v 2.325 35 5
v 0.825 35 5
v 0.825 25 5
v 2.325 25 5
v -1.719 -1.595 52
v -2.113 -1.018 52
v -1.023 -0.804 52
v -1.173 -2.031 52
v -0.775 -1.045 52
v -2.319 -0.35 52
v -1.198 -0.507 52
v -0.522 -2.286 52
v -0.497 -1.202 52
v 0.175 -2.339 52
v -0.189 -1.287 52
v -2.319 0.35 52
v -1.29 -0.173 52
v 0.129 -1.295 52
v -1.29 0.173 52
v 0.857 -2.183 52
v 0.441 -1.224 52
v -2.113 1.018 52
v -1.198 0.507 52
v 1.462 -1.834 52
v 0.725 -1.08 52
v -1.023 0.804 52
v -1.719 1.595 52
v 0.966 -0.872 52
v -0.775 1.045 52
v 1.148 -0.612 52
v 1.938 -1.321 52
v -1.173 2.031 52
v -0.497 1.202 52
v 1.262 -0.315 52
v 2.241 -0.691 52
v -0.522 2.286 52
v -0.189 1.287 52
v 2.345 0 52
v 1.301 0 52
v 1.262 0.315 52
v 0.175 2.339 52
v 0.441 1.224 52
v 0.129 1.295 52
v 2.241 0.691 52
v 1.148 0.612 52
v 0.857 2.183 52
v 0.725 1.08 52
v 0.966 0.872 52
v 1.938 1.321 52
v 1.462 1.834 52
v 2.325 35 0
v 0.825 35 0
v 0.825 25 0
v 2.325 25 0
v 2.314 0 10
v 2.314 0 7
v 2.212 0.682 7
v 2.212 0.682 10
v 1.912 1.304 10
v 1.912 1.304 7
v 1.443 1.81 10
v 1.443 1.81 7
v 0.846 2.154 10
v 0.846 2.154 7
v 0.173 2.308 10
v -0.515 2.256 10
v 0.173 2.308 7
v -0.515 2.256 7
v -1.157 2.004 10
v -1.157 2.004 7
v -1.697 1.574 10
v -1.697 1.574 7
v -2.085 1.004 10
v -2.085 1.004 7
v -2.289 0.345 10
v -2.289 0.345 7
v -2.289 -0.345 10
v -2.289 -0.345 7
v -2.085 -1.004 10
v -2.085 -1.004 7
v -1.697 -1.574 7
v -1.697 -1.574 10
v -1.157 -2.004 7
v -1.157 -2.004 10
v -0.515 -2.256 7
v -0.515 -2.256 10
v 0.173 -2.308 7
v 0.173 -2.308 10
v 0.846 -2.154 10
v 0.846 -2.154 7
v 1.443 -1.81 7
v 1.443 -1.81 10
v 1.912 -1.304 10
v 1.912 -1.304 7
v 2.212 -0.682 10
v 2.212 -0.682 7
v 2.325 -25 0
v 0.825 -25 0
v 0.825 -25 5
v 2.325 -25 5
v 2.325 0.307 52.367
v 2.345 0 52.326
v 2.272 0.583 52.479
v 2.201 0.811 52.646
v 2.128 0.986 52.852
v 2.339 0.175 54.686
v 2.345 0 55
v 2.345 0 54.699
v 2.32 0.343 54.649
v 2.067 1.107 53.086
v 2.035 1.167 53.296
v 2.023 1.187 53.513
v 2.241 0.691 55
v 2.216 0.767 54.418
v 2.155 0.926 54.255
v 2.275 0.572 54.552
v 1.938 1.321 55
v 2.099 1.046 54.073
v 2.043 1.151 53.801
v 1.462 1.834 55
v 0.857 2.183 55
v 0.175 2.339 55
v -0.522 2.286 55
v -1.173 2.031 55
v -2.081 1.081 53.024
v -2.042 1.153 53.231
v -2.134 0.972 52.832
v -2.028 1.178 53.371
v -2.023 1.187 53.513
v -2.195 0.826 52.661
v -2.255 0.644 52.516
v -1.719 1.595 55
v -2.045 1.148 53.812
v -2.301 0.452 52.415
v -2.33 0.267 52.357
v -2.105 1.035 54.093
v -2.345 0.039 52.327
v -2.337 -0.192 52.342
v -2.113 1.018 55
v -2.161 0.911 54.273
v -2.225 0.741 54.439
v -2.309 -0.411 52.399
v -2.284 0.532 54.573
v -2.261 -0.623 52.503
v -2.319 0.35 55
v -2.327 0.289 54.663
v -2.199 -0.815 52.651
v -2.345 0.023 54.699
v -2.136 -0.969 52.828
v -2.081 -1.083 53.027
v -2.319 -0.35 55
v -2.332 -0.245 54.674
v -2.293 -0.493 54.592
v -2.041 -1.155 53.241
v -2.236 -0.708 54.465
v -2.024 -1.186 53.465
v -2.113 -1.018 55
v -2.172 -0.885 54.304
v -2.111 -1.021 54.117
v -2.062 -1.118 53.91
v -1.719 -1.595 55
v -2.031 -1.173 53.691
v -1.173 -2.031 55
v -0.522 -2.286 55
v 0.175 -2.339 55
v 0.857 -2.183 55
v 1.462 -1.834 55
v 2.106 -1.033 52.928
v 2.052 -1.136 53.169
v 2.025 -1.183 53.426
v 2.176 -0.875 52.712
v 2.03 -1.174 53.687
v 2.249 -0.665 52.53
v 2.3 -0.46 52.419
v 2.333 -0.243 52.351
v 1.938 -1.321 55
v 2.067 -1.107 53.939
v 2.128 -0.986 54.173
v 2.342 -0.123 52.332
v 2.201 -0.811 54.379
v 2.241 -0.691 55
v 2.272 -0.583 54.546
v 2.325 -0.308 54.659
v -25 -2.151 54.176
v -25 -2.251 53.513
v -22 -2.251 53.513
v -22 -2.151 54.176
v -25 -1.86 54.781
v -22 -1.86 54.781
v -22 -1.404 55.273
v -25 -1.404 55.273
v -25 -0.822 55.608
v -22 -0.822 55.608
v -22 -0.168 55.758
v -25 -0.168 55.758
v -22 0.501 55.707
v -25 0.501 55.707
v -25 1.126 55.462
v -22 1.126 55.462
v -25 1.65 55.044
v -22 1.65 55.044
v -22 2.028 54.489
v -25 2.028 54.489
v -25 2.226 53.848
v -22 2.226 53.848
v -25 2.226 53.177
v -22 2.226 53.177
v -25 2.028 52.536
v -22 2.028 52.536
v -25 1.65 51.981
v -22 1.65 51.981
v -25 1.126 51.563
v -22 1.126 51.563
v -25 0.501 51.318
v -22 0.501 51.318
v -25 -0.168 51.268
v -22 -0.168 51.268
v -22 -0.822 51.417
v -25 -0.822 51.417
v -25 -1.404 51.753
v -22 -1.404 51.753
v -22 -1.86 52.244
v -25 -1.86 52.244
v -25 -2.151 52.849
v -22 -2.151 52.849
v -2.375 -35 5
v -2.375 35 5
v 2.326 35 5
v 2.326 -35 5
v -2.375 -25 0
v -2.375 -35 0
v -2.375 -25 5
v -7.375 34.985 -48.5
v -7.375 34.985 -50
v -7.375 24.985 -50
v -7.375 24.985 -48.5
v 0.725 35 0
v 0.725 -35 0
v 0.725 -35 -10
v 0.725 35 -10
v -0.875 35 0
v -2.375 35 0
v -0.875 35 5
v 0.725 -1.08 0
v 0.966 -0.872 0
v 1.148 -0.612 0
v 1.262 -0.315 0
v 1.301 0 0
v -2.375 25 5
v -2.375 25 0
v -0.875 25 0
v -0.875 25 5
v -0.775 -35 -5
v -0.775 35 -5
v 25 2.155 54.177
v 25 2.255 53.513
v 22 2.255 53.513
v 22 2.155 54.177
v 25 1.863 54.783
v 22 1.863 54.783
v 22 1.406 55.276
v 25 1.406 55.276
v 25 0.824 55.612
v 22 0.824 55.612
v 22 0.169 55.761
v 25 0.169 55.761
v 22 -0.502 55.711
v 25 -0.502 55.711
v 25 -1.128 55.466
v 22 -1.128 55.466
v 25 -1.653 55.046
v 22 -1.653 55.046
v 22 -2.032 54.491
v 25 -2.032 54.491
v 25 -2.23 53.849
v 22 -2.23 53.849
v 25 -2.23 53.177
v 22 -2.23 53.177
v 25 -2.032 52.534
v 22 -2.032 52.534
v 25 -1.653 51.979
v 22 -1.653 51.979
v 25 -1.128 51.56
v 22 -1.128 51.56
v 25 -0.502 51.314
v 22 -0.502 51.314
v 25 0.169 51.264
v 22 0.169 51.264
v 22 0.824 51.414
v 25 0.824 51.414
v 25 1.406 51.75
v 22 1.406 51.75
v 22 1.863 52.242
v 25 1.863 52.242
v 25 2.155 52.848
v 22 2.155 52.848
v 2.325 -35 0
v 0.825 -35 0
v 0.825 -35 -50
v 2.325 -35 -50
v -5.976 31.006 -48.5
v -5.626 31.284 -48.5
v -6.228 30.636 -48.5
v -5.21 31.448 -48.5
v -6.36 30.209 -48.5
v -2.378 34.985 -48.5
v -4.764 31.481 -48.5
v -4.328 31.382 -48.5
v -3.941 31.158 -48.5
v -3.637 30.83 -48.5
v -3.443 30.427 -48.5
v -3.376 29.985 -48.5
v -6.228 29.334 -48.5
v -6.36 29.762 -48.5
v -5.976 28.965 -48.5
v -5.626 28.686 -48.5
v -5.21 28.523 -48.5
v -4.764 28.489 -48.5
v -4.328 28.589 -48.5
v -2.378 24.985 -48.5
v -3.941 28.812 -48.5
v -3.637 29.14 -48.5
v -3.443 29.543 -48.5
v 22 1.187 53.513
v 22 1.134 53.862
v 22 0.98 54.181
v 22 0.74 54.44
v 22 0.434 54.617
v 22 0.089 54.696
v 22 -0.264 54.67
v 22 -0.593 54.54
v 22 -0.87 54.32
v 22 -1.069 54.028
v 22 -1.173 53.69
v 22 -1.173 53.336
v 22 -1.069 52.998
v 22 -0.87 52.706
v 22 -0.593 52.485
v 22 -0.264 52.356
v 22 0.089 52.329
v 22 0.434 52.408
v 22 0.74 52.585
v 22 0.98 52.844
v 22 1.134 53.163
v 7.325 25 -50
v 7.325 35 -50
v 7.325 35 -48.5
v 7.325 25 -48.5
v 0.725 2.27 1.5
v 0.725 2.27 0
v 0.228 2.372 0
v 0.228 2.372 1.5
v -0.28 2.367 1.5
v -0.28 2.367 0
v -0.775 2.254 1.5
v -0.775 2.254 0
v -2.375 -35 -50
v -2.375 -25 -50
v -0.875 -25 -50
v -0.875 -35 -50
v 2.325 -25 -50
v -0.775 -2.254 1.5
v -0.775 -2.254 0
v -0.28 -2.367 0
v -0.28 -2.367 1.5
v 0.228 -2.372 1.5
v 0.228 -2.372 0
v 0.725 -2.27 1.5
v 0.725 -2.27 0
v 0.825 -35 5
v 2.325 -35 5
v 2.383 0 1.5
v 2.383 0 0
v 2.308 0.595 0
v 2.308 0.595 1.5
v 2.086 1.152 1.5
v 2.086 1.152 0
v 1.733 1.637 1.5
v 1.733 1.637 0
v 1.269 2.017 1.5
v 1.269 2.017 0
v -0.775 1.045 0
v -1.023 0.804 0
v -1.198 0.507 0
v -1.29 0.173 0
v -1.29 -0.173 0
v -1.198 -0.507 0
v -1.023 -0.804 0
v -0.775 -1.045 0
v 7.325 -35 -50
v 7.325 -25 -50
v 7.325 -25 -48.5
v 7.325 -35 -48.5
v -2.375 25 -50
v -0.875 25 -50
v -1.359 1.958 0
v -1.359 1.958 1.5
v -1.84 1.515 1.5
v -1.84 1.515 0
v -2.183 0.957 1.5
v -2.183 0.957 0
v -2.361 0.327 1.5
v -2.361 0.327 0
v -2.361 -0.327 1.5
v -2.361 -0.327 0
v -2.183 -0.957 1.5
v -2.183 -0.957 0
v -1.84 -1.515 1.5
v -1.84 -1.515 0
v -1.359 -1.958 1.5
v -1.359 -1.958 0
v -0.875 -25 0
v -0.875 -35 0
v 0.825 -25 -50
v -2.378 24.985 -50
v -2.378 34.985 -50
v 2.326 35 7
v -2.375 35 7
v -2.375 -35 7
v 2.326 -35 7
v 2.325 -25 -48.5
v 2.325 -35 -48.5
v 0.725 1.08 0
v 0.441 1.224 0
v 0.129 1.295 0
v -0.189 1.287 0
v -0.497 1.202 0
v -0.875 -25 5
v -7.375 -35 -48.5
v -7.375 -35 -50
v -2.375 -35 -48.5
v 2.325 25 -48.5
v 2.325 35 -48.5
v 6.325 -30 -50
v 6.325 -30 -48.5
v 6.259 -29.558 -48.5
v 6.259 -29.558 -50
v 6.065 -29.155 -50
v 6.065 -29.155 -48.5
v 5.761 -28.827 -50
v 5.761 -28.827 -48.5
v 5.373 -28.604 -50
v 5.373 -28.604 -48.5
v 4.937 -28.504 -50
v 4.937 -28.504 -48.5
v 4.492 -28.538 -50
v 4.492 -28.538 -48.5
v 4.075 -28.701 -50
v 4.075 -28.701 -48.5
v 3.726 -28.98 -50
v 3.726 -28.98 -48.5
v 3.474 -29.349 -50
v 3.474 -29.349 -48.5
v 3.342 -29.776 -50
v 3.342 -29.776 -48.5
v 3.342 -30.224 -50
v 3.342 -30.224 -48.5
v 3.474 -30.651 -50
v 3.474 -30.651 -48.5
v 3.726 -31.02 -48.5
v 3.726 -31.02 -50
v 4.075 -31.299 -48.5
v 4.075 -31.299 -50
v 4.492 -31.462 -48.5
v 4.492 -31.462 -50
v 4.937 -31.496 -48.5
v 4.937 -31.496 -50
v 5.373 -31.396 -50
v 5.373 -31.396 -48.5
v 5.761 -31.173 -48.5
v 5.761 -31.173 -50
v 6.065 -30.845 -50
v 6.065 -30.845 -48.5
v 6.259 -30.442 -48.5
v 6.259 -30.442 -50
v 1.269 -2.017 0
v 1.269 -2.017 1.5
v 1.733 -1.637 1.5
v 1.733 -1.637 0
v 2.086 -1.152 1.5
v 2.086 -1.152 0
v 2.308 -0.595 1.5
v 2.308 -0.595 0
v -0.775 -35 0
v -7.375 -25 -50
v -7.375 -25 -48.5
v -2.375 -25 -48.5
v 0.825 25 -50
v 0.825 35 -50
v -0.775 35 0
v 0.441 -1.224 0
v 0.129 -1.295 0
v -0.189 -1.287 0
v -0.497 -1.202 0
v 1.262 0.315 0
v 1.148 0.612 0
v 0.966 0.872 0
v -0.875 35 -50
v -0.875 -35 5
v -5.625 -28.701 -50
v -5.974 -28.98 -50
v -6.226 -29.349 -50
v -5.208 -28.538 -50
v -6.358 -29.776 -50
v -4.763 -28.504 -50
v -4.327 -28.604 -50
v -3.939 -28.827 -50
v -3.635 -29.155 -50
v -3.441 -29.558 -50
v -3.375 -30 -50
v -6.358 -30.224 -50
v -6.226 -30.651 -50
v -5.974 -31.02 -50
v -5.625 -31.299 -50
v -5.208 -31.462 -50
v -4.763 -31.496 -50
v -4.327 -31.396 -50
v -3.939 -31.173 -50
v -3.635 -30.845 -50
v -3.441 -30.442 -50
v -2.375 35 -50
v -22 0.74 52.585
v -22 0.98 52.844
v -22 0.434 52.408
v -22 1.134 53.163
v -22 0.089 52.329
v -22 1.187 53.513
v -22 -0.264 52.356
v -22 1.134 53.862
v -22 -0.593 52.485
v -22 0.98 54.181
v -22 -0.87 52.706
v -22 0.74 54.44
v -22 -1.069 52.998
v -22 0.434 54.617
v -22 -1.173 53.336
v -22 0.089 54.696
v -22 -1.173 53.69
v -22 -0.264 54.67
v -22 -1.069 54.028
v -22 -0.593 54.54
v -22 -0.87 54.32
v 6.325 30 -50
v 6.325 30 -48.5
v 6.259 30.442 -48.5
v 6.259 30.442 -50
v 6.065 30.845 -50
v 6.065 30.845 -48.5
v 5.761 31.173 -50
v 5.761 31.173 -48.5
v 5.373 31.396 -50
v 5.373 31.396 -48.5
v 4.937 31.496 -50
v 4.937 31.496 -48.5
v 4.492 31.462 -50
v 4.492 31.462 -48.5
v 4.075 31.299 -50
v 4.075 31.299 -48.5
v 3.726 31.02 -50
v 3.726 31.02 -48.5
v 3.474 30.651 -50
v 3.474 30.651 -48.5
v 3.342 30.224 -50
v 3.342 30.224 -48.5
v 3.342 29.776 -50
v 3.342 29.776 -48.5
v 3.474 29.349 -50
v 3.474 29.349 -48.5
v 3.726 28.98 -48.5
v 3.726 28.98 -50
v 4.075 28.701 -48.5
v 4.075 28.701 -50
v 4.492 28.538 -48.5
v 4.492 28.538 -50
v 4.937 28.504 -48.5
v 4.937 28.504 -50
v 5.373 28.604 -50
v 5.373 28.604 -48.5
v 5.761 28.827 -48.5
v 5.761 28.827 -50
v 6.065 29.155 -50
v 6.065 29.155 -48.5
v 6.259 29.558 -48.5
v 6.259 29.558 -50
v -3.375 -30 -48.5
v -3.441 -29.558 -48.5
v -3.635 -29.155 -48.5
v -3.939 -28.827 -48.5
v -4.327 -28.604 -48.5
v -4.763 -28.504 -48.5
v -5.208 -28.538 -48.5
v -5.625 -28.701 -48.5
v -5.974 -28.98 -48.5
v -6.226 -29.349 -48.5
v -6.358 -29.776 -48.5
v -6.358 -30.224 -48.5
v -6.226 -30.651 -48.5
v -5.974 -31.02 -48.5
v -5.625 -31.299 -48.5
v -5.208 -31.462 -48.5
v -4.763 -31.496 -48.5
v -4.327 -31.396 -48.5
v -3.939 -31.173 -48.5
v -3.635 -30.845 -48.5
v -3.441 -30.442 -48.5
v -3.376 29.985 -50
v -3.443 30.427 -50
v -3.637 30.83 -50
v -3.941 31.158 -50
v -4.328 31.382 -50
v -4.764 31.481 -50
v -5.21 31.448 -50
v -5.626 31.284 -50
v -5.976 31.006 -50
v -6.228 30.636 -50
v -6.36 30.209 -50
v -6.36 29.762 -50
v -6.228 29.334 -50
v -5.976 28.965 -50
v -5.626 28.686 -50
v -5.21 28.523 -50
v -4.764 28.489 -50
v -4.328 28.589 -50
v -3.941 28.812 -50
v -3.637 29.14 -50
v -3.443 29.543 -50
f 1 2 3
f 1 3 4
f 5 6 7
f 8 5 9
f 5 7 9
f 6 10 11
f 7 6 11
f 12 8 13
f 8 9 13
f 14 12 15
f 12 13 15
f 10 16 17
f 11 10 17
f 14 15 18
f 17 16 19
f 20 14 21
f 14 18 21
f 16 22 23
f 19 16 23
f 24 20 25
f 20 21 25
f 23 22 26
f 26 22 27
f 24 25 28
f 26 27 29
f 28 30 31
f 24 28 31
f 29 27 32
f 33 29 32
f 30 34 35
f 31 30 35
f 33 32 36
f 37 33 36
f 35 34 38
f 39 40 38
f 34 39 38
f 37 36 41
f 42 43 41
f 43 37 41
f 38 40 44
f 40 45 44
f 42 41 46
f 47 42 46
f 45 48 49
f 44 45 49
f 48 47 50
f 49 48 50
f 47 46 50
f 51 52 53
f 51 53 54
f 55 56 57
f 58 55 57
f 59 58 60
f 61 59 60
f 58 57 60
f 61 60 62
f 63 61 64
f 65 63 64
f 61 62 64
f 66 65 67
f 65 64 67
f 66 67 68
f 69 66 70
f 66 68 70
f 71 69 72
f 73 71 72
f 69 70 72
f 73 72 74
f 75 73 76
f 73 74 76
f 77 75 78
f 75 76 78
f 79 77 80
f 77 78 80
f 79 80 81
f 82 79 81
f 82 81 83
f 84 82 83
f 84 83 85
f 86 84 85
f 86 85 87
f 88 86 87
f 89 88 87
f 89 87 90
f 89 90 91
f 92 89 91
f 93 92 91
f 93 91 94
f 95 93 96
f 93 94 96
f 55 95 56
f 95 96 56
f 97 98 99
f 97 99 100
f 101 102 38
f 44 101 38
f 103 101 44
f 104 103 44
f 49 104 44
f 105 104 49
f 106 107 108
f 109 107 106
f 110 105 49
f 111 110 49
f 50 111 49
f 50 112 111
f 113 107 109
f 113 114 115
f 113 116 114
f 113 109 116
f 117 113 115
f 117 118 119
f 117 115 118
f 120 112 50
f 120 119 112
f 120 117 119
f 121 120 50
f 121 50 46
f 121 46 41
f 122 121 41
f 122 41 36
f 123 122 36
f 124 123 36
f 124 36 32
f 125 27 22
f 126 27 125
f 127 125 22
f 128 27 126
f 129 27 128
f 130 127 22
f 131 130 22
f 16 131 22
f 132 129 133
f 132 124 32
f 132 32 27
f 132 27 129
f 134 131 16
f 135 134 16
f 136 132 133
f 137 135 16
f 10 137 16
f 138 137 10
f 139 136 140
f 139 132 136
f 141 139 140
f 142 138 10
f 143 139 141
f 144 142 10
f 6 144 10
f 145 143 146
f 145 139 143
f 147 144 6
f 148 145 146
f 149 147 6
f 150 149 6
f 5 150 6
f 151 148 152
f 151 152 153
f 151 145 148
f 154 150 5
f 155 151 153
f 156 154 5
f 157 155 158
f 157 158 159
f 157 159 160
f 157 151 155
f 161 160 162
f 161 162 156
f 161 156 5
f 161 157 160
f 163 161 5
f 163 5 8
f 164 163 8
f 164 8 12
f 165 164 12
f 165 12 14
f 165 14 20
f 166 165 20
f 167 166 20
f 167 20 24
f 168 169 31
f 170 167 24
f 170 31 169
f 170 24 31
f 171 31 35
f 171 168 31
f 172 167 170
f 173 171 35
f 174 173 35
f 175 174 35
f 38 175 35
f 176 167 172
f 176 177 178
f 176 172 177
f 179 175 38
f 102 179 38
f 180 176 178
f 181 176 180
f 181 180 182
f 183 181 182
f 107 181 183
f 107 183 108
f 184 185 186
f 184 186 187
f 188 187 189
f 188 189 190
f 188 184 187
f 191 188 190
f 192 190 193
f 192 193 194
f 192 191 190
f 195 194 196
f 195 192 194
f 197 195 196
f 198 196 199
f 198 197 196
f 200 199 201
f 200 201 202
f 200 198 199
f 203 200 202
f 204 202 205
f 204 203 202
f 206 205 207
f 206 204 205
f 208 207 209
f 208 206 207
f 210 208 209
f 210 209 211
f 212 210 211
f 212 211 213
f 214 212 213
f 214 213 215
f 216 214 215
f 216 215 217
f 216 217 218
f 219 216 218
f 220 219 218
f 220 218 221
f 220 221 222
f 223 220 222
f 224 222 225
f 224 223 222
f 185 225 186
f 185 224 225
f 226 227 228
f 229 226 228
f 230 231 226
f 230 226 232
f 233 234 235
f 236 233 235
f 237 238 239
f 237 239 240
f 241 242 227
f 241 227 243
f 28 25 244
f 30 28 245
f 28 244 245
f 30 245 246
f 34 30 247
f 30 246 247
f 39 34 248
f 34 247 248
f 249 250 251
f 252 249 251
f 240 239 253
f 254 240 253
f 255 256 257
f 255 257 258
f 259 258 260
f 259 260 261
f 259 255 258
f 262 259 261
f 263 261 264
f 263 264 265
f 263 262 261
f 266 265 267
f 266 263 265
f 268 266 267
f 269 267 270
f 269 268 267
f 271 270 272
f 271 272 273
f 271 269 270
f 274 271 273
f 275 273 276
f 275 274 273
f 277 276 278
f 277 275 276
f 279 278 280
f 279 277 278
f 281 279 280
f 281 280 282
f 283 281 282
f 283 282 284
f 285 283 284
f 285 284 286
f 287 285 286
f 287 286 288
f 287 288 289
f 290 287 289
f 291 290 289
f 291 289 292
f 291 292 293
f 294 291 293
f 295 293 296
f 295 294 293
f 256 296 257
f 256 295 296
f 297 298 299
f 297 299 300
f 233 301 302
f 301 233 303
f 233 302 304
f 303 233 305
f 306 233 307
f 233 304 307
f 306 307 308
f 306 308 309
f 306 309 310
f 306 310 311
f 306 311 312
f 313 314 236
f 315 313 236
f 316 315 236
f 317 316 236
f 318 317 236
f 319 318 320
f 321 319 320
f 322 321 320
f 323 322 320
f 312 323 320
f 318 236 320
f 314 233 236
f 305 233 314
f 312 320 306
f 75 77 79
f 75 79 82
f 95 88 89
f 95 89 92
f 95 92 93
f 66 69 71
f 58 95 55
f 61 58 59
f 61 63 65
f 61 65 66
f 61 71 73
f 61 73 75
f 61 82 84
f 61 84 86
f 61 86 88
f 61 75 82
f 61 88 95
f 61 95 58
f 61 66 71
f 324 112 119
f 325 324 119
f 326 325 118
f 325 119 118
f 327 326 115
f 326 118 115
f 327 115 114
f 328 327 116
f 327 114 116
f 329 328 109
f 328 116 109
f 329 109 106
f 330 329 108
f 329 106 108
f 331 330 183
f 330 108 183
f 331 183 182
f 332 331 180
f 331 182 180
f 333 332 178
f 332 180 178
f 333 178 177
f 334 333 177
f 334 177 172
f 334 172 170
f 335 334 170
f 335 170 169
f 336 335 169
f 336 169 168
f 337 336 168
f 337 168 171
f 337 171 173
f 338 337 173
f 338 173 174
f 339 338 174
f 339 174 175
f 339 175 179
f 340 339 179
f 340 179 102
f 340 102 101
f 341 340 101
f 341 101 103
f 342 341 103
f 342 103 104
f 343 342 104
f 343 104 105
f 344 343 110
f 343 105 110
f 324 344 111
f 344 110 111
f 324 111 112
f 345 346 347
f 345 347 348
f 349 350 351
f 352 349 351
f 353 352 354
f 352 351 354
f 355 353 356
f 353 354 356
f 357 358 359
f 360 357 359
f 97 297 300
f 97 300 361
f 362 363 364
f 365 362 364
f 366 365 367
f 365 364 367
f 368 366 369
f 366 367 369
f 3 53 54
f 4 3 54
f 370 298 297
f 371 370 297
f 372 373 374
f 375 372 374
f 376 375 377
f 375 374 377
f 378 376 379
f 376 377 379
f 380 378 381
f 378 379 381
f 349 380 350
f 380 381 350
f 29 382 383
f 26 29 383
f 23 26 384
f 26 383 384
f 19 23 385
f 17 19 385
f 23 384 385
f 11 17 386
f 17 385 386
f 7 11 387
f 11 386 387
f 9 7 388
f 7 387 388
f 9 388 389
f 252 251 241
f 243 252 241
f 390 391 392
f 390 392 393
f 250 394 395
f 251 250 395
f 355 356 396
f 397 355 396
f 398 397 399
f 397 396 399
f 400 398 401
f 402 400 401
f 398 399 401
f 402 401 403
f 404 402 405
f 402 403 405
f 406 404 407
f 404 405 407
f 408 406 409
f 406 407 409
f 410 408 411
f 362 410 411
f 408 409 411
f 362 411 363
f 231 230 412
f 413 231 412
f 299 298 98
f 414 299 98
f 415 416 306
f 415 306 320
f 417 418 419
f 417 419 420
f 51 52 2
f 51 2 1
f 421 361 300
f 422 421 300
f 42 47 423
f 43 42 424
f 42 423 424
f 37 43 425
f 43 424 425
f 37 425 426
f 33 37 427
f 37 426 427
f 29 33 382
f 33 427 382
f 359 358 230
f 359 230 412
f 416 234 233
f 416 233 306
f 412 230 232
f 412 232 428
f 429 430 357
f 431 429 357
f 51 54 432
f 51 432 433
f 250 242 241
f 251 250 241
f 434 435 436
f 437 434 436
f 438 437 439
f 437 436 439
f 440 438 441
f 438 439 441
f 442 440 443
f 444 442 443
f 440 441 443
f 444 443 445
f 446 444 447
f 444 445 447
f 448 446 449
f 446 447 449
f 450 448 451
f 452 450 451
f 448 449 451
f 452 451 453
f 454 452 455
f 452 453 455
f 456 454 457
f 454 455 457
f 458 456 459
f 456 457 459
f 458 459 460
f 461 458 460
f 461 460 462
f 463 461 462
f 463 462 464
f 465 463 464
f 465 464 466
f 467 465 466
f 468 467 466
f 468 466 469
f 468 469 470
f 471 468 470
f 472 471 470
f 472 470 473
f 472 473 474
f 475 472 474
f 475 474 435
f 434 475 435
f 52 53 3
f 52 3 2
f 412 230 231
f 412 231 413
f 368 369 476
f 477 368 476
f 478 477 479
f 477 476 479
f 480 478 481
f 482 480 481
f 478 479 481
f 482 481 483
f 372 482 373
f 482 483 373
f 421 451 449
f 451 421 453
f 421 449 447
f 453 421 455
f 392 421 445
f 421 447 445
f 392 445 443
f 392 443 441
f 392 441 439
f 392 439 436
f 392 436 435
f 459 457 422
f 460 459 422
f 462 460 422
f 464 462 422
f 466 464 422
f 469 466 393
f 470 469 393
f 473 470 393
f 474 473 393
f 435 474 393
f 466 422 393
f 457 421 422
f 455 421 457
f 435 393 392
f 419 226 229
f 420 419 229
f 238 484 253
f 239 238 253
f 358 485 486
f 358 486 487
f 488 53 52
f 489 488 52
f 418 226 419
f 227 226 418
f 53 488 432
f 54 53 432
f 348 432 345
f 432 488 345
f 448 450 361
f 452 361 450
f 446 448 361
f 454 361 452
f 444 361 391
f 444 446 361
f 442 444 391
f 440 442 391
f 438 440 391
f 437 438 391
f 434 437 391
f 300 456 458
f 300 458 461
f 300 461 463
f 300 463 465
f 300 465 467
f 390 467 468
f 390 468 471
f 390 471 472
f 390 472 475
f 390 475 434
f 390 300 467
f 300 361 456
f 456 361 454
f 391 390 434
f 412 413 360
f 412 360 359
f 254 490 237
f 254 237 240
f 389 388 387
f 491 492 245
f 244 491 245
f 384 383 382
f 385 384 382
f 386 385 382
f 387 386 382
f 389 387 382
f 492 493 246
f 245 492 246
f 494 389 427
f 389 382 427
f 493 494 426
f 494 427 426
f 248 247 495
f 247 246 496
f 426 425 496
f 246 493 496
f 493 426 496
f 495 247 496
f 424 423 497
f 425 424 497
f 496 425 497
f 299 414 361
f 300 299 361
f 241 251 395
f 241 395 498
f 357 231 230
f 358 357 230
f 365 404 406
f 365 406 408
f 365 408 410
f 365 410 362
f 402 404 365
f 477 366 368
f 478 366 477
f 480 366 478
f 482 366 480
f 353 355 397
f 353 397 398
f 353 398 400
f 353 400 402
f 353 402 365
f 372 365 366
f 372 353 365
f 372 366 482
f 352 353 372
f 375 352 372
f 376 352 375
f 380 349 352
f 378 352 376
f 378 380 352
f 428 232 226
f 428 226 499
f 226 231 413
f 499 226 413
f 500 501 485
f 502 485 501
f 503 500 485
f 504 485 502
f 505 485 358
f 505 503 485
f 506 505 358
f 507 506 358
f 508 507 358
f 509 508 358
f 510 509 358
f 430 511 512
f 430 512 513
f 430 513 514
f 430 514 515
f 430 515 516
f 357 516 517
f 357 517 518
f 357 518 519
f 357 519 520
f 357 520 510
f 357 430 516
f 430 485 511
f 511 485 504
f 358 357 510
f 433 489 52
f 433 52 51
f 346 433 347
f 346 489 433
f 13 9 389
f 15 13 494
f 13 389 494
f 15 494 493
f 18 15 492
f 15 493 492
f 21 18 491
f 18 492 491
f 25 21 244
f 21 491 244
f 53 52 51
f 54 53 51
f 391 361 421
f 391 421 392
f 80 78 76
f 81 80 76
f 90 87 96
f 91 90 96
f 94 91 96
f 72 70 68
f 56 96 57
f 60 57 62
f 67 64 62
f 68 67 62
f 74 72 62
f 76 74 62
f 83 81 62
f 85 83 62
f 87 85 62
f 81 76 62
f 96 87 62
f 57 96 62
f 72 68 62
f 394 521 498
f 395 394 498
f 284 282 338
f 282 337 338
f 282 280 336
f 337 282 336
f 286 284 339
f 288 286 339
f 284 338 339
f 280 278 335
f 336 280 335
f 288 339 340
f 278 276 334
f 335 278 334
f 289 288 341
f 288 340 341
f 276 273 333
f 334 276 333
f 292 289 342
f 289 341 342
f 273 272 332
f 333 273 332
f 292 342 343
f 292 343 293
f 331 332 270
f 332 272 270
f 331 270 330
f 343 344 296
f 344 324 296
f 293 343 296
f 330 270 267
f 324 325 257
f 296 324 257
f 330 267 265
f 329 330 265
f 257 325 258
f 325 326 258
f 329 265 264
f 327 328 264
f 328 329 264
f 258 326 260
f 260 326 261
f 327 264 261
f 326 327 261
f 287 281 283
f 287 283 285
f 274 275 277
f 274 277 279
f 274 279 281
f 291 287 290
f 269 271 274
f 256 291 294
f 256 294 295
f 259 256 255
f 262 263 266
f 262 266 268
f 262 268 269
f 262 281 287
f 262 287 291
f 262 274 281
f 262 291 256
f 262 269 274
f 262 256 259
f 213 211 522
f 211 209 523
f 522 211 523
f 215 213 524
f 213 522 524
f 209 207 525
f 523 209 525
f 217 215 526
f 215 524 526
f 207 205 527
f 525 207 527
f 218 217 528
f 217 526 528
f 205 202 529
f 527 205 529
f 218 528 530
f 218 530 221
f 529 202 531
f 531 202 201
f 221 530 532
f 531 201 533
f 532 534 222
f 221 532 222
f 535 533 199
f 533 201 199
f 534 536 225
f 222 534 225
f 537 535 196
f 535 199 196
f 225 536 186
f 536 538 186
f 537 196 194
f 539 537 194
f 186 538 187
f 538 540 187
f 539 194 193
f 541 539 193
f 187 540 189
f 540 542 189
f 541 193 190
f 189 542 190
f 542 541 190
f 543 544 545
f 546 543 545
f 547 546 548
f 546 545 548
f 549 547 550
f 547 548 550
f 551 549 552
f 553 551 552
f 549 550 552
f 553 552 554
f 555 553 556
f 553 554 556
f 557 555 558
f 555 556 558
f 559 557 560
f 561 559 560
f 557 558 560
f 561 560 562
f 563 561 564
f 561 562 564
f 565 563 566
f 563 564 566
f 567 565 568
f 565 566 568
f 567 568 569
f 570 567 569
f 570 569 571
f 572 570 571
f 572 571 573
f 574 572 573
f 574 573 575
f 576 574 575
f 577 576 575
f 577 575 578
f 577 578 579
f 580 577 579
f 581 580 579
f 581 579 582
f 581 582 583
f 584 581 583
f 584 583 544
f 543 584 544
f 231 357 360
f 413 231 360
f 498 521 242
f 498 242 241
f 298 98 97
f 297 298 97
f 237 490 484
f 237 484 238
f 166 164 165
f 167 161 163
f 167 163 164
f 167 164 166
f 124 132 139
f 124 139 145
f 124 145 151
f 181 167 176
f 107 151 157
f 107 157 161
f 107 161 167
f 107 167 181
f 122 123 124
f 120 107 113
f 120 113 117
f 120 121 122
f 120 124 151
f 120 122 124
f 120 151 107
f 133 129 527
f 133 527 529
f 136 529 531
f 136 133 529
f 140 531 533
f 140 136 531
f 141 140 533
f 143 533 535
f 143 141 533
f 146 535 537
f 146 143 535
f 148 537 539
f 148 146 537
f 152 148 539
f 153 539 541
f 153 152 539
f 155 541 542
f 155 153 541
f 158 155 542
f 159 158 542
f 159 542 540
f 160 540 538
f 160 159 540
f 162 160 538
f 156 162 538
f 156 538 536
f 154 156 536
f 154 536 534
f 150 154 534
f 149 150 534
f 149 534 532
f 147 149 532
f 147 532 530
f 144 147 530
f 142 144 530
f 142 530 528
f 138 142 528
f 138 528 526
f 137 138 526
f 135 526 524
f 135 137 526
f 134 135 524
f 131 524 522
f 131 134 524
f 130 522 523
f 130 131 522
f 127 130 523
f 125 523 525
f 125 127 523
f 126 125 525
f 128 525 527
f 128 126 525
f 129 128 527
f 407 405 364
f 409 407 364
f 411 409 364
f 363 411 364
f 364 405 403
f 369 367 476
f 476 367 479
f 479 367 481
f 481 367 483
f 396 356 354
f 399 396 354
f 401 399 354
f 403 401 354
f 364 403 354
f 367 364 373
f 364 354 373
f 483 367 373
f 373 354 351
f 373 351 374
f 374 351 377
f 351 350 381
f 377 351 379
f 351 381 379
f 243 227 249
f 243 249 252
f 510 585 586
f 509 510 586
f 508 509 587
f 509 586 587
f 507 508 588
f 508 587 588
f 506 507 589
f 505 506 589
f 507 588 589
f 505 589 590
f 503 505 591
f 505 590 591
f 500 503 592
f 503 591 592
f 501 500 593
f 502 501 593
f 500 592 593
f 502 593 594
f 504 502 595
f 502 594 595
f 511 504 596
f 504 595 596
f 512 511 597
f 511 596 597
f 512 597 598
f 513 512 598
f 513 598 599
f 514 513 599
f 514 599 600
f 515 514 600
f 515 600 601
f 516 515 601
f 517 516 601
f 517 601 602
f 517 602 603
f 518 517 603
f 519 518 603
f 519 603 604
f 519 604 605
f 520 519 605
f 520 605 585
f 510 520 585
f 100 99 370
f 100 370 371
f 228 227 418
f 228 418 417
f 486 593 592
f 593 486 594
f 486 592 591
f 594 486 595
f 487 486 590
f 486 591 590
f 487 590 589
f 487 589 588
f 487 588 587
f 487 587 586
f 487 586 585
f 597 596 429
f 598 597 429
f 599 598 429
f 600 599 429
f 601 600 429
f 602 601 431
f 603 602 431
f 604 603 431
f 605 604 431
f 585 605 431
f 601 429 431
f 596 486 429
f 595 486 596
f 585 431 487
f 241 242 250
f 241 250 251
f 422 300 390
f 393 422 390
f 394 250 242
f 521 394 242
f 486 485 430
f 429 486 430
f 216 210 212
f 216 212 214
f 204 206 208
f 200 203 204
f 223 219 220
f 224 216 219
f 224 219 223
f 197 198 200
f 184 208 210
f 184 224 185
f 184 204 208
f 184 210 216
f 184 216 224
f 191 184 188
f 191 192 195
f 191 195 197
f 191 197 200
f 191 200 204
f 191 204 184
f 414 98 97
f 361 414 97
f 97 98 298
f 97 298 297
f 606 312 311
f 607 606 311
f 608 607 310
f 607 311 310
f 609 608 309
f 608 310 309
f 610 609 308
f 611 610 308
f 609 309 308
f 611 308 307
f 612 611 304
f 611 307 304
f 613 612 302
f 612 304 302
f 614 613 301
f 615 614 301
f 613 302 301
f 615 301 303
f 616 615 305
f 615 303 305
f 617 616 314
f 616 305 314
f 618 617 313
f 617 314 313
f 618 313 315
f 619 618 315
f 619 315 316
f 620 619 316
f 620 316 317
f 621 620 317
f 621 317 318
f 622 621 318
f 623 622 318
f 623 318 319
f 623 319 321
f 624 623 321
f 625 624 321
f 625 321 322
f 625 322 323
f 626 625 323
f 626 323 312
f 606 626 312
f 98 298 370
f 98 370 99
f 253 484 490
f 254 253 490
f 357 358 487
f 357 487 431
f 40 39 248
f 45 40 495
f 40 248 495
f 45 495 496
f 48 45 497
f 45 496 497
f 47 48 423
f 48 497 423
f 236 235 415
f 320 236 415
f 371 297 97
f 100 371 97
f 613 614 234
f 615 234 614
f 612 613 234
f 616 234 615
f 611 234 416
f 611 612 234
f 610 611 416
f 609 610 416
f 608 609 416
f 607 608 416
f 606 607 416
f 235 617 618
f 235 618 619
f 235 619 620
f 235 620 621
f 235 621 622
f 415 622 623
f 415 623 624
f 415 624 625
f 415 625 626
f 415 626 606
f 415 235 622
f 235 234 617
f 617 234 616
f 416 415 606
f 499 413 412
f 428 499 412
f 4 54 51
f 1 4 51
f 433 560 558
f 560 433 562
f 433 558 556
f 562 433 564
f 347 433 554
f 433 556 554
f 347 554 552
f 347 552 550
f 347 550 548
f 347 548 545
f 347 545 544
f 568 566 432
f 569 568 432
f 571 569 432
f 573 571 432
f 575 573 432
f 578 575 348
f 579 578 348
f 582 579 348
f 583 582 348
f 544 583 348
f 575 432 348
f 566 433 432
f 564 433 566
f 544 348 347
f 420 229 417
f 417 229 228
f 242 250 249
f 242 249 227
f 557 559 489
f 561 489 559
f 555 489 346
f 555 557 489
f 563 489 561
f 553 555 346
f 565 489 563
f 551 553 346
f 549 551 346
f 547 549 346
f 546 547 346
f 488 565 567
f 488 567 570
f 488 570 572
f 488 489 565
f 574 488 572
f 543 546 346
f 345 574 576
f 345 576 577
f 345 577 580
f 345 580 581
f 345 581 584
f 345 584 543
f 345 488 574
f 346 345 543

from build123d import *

# Parameters (mm, degrees)
F0_W      = 1.5
F0_H      = 70
F1_DEPTH  = 10
F3_DEPTH  = 70.001
F4_W      = 1.5
F4_H      = 10
F5_DEPTH  = 50
F6_DEPTH  = 5
F7_W      = 4.7004564702
F7_H      = 70.0002348423
F8_DEPTH  = 2
F11_DEPTH = 55
F9_R      = 2.3144907663
F12_DEPTH = 3
F13_R     = 2.3453015316
F13_R_2   = 1.3011317458
F14_DEPTH = 3
F15_R     = 1.186628288
F16_DEPTH = 25
F17_R     = 2.2512446739
F17_R_2   = 1.186628288
F18_DEPTH = 3
F19_DEPTH = 25
F20_R     = 2.2550084993
F20_R_2   = 1.186628288
F21_DEPTH = 3
F22_W     = 5
F22_H     = 10
F23_DEPTH = 1.5
F24_W     = 5
F24_H     = 10
F25_DEPTH = 1.5
F24_W_2   = 4.9965837158
F27_R     = 1.5
F28_DEPTH = 1.501
F26_R     = 1.5
F29_DEPTH = 1.501
F31_R     = 1.5
F32_DEPTH = 1.501
F30_R     = 1.5
F33_DEPTH = 1.501
F35_DEPTH = 1.5


# Not quite as in the source:
# - the program builds the solid bodies; features that only make, move or delete a surface that nothing else refers to are left out


with BuildPart() as f1:
    # F0 (on Top) → F1 (new body)
    with BuildSketch(Plane.XY):
        with Locations((-0.0246972009, 0)):
            Rectangle(F0_W, F0_H)
    extrude(amount=-F1_DEPTH)

    # F2 (on face) → F3 (cut, through all)
    with BuildSketch(Plane.XZ.offset(35)):
        Polygon((0.7253027991, -10), (-0.7746972009, -5), (-0.7746972009, -10), align=None)
    extrude(amount=-F3_DEPTH, mode=Mode.SUBTRACT)


with BuildPart() as f5:
    # F4 (on face) → F5 (new body)
    with BuildSketch(Plane.XY):
        with Locations((1.5753027991, 30)):
            Rectangle(F4_W, F4_H)
    extrude(amount=-F5_DEPTH)

    # F24 (on face) → F25 (join)
    with BuildSketch(Plane(origin=(0, 0, -50), x_dir=(1, 0, 0), z_dir=(0, 0, -1))):
        with Locations((4.8253027991, -30)):
            Rectangle(F24_W, F24_H)
    extrude(amount=-F25_DEPTH)

    # F26 (on face) → F29 (cut, through all)
    with BuildSketch(Plane.XY.offset(-48.5)):
        with Locations((4.8253027991, 30)):
            Circle(F26_R)
    extrude(amount=-F29_DEPTH, mode=Mode.SUBTRACT)


with BuildPart() as f5b:
    # F4 (on face) → F5, piece 2 (new body)
    with BuildSketch(Plane.XY):
        with Locations((-1.6246972009, 30)):
            Rectangle(F4_W, F4_H)
    extrude(amount=-F5_DEPTH)


with BuildPart() as f5c:
    # F4 (on face) → F5, piece 3 (new body)
    with BuildSketch(Plane.XY):
        with Locations((-1.6246972009, -30)):
            Rectangle(F4_W, F4_H)
    extrude(amount=-F5_DEPTH)


with BuildPart() as f5d:
    # F4 (on face) → F5, piece 4 (new body)
    with BuildSketch(Plane.XY):
        with Locations((1.5753027991, -30)):
            Rectangle(F4_W, F4_H)
    extrude(amount=-F5_DEPTH)


with BuildPart() as f6:
    # F4 (on face) → F6 (new body)
    with BuildSketch(Plane.XY):
        with Locations((-1.6246972009, 30)):
            Rectangle(F4_W, F4_H)
    extrude(amount=F6_DEPTH)


with BuildPart() as f6b:
    # F4 (on face) → F6, piece 2 (new body)
    with BuildSketch(Plane.XY):
        with Locations((1.5753027991, 30)):
            Rectangle(F4_W, F4_H)
    extrude(amount=F6_DEPTH)


with BuildPart() as f6c:
    # F4 (on face) → F6, piece 3 (new body)
    with BuildSketch(Plane.XY):
        with Locations((-1.6246972009, -30)):
            Rectangle(F4_W, F4_H)
    extrude(amount=F6_DEPTH)


with BuildPart() as f6d:
    # F4 (on face) → F6, piece 4 (new body)
    with BuildSketch(Plane.XY):
        with Locations((1.5753027991, -30)):
            Rectangle(F4_W, F4_H)
    extrude(amount=F6_DEPTH)


with BuildPart() as f8:
    # F7 (on face) → F8 (new body)
    with BuildSketch(Plane.XY.offset(5)):
        with Locations((-0.0244689658, -0.0001174212)):
            Rectangle(F7_W, F7_H)
    extrude(amount=F8_DEPTH)


with BuildPart() as f11:
    # F10 (on face) → F11 (new body)
    with BuildSketch(Plane.XY):
        with BuildLine():
            Line((-0.7746972009, -1.0453650399), (-0.7746972009, 1.0453650399))
            ThreePointArc((-0.7746972009, 1.0453650399), (-1.3011317458, 0), (-0.7746972009, -1.0453650399))
        make_face()
        with BuildLine():
            ThreePointArc((0.7253027991, -1.0802220464), (1.1481851586, -0.6120577271), (1.3011317458, 0))
            ThreePointArc((1.3011317458, 0), (1.1481851586, 0.6120577271), (0.7253027991, 1.0802220464))
            Line((0.7253027991, 1.0802220464), (0.7253027991, -1.0802220464))
        make_face()
        with BuildLine():
            Line((0.7253027991, -1.0802220464), (0.7253027991, 1.0802220464))
            ThreePointArc((0.7253027991, 1.0802220464), (-0.0302275447, 1.3007805792), (-0.7746972009, 1.0453650399))
            Line((-0.7746972009, 1.0453650399), (-0.7746972009, -1.0453650399))
            ThreePointArc((-0.7746972009, -1.0453650399), (-0.0302275447, -1.3007805792), (0.7253027991, -1.0802220464))
        make_face()
    extrude(amount=F11_DEPTH)

    # F13 (on face) → F14 (join)
    with BuildSketch(Plane.XY.offset(55)):
        Circle(F13_R)
        Circle(F13_R_2, mode=Mode.SUBTRACT)
    extrude(amount=-F14_DEPTH)

    # F15 (on Right) → F16 (join)
    with BuildSketch(Plane.YZ):
        with Locations((0, 53.5126663744)):
            Circle(F15_R)
    extrude(amount=-F16_DEPTH)

    # F17 (on face) → F18 (join)
    with BuildSketch(Plane(origin=(-25, 0, 0), x_dir=(0, -1, 0), z_dir=(-1, 0, 0))):
        with Locations((0, 53.5126663744)):
            Circle(F17_R)
        with Locations((0, 53.5126663744)):
            Circle(F17_R_2, mode=Mode.SUBTRACT)
    extrude(amount=-F18_DEPTH)

    # F15 (on Right) → F19 (join)
    with BuildSketch(Plane.YZ):
        with Locations((0, 53.5126663744)):
            Circle(F15_R)
    extrude(amount=F19_DEPTH)

    # F20 (on face) → F21 (join)
    with BuildSketch(Plane.YZ.offset(25)):
        with Locations((0, 53.5126663744)):
            Circle(F20_R)
        with Locations((0, 53.5126663744)):
            Circle(F20_R_2, mode=Mode.SUBTRACT)
    extrude(amount=-F21_DEPTH)


with BuildPart() as f12:
    # F9 (on face) → F12 (new body)
    with BuildSketch(Plane.XY.offset(7)):
        Circle(F9_R)
    extrude(amount=F12_DEPTH)


with BuildPart() as f23:
    # F22 (on face) → F23 (new body)
    with BuildSketch(Plane(origin=(0, 0, -50), x_dir=(1, 0, 0), z_dir=(0, 0, -1))):
        with Locations((4.8253027991, 30)):
            Rectangle(F22_W, F22_H)
    extrude(amount=-F23_DEPTH)

    # F30 (on face) → F33 (cut, through all)
    with BuildSketch(Plane.XY.offset(-48.5)):
        with Locations((4.8253027991, -30)):
            Circle(F30_R)
    extrude(amount=-F33_DEPTH, mode=Mode.SUBTRACT)


with BuildPart() as f23b:
    # F22 (on face) → F23, piece 2 (new body)
    with BuildSketch(Plane(origin=(0, 0, -50), x_dir=(1, 0, 0), z_dir=(0, 0, -1))):
        with Locations((-4.8746972009, 30)):
            Rectangle(F22_W, F22_H)
    extrude(amount=-F23_DEPTH)

    # F31 (on face) → F32 (cut, through all)
    with BuildSketch(Plane.XY.offset(-48.5)):
        with Locations((-4.8746972009, -30)):
            Circle(F31_R)
    extrude(amount=-F32_DEPTH, mode=Mode.SUBTRACT)


with BuildPart() as f25:
    # F24 (on face) → F25, piece 2 (new body)
    with BuildSketch(Plane(origin=(0, 0, -50), x_dir=(1, 0, 0), z_dir=(0, 0, -1))):
        with Locations((-4.8763835644, -29.9852424113)):
            Rectangle(F24_W_2, F24_H)
    extrude(amount=-F25_DEPTH)

    # F27 (on face) → F28 (cut, through all)
    with BuildSketch(Plane.XY.offset(-48.5)):
        with Locations((-4.8763835644, 29.9852424113)):
            Circle(F27_R)
    extrude(amount=-F28_DEPTH, mode=Mode.SUBTRACT)


with BuildPart() as f35:
    # F34 (on face) → F35 (new body)
    with BuildSketch(Plane.XY):
        with BuildLine():
            Line((-0.7746972009, -2.2538692437), (-0.7746972009, 2.2538692437))
            ThreePointArc((-0.7746972009, 2.2538692437), (-2.383292328, 0), (-0.7746972009, -2.2538692437))
        make_face()
        with BuildLine():
            Line((0.7253027991, -2.2702462797), (0.7253027991, 2.2702462797))
            ThreePointArc((0.7253027991, 2.2702462797), (-0.0260192921, 2.3831502926), (-0.7746972009, 2.2538692437))
            Line((-0.7746972009, 2.2538692437), (-0.7746972009, -2.2538692437))
            ThreePointArc((-0.7746972009, -2.2538692437), (-0.0260192921, -2.3831502926), (0.7253027991, -2.2702462797))
        make_face()
        with BuildLine():
            ThreePointArc((0.7253027991, -2.2702462797), (1.9246676229, -1.4056090716), (2.383292328, 0))
            ThreePointArc((2.383292328, 0), (1.9246676229, 1.4056090716), (0.7253027991, 2.2702462797))
            Line((0.7253027991, 2.2702462797), (0.7253027991, -2.2702462797))
        make_face()
    extrude(amount=F35_DEPTH)


solid = Compound([f1.part, f5.part, f5b.part, f5c.part, f5d.part, f6.part, f6b.part, f6c.part, f6d.part, f8.part, f11.part, f12.part, f23.part, f23b.part, f25.part, f35.part])
